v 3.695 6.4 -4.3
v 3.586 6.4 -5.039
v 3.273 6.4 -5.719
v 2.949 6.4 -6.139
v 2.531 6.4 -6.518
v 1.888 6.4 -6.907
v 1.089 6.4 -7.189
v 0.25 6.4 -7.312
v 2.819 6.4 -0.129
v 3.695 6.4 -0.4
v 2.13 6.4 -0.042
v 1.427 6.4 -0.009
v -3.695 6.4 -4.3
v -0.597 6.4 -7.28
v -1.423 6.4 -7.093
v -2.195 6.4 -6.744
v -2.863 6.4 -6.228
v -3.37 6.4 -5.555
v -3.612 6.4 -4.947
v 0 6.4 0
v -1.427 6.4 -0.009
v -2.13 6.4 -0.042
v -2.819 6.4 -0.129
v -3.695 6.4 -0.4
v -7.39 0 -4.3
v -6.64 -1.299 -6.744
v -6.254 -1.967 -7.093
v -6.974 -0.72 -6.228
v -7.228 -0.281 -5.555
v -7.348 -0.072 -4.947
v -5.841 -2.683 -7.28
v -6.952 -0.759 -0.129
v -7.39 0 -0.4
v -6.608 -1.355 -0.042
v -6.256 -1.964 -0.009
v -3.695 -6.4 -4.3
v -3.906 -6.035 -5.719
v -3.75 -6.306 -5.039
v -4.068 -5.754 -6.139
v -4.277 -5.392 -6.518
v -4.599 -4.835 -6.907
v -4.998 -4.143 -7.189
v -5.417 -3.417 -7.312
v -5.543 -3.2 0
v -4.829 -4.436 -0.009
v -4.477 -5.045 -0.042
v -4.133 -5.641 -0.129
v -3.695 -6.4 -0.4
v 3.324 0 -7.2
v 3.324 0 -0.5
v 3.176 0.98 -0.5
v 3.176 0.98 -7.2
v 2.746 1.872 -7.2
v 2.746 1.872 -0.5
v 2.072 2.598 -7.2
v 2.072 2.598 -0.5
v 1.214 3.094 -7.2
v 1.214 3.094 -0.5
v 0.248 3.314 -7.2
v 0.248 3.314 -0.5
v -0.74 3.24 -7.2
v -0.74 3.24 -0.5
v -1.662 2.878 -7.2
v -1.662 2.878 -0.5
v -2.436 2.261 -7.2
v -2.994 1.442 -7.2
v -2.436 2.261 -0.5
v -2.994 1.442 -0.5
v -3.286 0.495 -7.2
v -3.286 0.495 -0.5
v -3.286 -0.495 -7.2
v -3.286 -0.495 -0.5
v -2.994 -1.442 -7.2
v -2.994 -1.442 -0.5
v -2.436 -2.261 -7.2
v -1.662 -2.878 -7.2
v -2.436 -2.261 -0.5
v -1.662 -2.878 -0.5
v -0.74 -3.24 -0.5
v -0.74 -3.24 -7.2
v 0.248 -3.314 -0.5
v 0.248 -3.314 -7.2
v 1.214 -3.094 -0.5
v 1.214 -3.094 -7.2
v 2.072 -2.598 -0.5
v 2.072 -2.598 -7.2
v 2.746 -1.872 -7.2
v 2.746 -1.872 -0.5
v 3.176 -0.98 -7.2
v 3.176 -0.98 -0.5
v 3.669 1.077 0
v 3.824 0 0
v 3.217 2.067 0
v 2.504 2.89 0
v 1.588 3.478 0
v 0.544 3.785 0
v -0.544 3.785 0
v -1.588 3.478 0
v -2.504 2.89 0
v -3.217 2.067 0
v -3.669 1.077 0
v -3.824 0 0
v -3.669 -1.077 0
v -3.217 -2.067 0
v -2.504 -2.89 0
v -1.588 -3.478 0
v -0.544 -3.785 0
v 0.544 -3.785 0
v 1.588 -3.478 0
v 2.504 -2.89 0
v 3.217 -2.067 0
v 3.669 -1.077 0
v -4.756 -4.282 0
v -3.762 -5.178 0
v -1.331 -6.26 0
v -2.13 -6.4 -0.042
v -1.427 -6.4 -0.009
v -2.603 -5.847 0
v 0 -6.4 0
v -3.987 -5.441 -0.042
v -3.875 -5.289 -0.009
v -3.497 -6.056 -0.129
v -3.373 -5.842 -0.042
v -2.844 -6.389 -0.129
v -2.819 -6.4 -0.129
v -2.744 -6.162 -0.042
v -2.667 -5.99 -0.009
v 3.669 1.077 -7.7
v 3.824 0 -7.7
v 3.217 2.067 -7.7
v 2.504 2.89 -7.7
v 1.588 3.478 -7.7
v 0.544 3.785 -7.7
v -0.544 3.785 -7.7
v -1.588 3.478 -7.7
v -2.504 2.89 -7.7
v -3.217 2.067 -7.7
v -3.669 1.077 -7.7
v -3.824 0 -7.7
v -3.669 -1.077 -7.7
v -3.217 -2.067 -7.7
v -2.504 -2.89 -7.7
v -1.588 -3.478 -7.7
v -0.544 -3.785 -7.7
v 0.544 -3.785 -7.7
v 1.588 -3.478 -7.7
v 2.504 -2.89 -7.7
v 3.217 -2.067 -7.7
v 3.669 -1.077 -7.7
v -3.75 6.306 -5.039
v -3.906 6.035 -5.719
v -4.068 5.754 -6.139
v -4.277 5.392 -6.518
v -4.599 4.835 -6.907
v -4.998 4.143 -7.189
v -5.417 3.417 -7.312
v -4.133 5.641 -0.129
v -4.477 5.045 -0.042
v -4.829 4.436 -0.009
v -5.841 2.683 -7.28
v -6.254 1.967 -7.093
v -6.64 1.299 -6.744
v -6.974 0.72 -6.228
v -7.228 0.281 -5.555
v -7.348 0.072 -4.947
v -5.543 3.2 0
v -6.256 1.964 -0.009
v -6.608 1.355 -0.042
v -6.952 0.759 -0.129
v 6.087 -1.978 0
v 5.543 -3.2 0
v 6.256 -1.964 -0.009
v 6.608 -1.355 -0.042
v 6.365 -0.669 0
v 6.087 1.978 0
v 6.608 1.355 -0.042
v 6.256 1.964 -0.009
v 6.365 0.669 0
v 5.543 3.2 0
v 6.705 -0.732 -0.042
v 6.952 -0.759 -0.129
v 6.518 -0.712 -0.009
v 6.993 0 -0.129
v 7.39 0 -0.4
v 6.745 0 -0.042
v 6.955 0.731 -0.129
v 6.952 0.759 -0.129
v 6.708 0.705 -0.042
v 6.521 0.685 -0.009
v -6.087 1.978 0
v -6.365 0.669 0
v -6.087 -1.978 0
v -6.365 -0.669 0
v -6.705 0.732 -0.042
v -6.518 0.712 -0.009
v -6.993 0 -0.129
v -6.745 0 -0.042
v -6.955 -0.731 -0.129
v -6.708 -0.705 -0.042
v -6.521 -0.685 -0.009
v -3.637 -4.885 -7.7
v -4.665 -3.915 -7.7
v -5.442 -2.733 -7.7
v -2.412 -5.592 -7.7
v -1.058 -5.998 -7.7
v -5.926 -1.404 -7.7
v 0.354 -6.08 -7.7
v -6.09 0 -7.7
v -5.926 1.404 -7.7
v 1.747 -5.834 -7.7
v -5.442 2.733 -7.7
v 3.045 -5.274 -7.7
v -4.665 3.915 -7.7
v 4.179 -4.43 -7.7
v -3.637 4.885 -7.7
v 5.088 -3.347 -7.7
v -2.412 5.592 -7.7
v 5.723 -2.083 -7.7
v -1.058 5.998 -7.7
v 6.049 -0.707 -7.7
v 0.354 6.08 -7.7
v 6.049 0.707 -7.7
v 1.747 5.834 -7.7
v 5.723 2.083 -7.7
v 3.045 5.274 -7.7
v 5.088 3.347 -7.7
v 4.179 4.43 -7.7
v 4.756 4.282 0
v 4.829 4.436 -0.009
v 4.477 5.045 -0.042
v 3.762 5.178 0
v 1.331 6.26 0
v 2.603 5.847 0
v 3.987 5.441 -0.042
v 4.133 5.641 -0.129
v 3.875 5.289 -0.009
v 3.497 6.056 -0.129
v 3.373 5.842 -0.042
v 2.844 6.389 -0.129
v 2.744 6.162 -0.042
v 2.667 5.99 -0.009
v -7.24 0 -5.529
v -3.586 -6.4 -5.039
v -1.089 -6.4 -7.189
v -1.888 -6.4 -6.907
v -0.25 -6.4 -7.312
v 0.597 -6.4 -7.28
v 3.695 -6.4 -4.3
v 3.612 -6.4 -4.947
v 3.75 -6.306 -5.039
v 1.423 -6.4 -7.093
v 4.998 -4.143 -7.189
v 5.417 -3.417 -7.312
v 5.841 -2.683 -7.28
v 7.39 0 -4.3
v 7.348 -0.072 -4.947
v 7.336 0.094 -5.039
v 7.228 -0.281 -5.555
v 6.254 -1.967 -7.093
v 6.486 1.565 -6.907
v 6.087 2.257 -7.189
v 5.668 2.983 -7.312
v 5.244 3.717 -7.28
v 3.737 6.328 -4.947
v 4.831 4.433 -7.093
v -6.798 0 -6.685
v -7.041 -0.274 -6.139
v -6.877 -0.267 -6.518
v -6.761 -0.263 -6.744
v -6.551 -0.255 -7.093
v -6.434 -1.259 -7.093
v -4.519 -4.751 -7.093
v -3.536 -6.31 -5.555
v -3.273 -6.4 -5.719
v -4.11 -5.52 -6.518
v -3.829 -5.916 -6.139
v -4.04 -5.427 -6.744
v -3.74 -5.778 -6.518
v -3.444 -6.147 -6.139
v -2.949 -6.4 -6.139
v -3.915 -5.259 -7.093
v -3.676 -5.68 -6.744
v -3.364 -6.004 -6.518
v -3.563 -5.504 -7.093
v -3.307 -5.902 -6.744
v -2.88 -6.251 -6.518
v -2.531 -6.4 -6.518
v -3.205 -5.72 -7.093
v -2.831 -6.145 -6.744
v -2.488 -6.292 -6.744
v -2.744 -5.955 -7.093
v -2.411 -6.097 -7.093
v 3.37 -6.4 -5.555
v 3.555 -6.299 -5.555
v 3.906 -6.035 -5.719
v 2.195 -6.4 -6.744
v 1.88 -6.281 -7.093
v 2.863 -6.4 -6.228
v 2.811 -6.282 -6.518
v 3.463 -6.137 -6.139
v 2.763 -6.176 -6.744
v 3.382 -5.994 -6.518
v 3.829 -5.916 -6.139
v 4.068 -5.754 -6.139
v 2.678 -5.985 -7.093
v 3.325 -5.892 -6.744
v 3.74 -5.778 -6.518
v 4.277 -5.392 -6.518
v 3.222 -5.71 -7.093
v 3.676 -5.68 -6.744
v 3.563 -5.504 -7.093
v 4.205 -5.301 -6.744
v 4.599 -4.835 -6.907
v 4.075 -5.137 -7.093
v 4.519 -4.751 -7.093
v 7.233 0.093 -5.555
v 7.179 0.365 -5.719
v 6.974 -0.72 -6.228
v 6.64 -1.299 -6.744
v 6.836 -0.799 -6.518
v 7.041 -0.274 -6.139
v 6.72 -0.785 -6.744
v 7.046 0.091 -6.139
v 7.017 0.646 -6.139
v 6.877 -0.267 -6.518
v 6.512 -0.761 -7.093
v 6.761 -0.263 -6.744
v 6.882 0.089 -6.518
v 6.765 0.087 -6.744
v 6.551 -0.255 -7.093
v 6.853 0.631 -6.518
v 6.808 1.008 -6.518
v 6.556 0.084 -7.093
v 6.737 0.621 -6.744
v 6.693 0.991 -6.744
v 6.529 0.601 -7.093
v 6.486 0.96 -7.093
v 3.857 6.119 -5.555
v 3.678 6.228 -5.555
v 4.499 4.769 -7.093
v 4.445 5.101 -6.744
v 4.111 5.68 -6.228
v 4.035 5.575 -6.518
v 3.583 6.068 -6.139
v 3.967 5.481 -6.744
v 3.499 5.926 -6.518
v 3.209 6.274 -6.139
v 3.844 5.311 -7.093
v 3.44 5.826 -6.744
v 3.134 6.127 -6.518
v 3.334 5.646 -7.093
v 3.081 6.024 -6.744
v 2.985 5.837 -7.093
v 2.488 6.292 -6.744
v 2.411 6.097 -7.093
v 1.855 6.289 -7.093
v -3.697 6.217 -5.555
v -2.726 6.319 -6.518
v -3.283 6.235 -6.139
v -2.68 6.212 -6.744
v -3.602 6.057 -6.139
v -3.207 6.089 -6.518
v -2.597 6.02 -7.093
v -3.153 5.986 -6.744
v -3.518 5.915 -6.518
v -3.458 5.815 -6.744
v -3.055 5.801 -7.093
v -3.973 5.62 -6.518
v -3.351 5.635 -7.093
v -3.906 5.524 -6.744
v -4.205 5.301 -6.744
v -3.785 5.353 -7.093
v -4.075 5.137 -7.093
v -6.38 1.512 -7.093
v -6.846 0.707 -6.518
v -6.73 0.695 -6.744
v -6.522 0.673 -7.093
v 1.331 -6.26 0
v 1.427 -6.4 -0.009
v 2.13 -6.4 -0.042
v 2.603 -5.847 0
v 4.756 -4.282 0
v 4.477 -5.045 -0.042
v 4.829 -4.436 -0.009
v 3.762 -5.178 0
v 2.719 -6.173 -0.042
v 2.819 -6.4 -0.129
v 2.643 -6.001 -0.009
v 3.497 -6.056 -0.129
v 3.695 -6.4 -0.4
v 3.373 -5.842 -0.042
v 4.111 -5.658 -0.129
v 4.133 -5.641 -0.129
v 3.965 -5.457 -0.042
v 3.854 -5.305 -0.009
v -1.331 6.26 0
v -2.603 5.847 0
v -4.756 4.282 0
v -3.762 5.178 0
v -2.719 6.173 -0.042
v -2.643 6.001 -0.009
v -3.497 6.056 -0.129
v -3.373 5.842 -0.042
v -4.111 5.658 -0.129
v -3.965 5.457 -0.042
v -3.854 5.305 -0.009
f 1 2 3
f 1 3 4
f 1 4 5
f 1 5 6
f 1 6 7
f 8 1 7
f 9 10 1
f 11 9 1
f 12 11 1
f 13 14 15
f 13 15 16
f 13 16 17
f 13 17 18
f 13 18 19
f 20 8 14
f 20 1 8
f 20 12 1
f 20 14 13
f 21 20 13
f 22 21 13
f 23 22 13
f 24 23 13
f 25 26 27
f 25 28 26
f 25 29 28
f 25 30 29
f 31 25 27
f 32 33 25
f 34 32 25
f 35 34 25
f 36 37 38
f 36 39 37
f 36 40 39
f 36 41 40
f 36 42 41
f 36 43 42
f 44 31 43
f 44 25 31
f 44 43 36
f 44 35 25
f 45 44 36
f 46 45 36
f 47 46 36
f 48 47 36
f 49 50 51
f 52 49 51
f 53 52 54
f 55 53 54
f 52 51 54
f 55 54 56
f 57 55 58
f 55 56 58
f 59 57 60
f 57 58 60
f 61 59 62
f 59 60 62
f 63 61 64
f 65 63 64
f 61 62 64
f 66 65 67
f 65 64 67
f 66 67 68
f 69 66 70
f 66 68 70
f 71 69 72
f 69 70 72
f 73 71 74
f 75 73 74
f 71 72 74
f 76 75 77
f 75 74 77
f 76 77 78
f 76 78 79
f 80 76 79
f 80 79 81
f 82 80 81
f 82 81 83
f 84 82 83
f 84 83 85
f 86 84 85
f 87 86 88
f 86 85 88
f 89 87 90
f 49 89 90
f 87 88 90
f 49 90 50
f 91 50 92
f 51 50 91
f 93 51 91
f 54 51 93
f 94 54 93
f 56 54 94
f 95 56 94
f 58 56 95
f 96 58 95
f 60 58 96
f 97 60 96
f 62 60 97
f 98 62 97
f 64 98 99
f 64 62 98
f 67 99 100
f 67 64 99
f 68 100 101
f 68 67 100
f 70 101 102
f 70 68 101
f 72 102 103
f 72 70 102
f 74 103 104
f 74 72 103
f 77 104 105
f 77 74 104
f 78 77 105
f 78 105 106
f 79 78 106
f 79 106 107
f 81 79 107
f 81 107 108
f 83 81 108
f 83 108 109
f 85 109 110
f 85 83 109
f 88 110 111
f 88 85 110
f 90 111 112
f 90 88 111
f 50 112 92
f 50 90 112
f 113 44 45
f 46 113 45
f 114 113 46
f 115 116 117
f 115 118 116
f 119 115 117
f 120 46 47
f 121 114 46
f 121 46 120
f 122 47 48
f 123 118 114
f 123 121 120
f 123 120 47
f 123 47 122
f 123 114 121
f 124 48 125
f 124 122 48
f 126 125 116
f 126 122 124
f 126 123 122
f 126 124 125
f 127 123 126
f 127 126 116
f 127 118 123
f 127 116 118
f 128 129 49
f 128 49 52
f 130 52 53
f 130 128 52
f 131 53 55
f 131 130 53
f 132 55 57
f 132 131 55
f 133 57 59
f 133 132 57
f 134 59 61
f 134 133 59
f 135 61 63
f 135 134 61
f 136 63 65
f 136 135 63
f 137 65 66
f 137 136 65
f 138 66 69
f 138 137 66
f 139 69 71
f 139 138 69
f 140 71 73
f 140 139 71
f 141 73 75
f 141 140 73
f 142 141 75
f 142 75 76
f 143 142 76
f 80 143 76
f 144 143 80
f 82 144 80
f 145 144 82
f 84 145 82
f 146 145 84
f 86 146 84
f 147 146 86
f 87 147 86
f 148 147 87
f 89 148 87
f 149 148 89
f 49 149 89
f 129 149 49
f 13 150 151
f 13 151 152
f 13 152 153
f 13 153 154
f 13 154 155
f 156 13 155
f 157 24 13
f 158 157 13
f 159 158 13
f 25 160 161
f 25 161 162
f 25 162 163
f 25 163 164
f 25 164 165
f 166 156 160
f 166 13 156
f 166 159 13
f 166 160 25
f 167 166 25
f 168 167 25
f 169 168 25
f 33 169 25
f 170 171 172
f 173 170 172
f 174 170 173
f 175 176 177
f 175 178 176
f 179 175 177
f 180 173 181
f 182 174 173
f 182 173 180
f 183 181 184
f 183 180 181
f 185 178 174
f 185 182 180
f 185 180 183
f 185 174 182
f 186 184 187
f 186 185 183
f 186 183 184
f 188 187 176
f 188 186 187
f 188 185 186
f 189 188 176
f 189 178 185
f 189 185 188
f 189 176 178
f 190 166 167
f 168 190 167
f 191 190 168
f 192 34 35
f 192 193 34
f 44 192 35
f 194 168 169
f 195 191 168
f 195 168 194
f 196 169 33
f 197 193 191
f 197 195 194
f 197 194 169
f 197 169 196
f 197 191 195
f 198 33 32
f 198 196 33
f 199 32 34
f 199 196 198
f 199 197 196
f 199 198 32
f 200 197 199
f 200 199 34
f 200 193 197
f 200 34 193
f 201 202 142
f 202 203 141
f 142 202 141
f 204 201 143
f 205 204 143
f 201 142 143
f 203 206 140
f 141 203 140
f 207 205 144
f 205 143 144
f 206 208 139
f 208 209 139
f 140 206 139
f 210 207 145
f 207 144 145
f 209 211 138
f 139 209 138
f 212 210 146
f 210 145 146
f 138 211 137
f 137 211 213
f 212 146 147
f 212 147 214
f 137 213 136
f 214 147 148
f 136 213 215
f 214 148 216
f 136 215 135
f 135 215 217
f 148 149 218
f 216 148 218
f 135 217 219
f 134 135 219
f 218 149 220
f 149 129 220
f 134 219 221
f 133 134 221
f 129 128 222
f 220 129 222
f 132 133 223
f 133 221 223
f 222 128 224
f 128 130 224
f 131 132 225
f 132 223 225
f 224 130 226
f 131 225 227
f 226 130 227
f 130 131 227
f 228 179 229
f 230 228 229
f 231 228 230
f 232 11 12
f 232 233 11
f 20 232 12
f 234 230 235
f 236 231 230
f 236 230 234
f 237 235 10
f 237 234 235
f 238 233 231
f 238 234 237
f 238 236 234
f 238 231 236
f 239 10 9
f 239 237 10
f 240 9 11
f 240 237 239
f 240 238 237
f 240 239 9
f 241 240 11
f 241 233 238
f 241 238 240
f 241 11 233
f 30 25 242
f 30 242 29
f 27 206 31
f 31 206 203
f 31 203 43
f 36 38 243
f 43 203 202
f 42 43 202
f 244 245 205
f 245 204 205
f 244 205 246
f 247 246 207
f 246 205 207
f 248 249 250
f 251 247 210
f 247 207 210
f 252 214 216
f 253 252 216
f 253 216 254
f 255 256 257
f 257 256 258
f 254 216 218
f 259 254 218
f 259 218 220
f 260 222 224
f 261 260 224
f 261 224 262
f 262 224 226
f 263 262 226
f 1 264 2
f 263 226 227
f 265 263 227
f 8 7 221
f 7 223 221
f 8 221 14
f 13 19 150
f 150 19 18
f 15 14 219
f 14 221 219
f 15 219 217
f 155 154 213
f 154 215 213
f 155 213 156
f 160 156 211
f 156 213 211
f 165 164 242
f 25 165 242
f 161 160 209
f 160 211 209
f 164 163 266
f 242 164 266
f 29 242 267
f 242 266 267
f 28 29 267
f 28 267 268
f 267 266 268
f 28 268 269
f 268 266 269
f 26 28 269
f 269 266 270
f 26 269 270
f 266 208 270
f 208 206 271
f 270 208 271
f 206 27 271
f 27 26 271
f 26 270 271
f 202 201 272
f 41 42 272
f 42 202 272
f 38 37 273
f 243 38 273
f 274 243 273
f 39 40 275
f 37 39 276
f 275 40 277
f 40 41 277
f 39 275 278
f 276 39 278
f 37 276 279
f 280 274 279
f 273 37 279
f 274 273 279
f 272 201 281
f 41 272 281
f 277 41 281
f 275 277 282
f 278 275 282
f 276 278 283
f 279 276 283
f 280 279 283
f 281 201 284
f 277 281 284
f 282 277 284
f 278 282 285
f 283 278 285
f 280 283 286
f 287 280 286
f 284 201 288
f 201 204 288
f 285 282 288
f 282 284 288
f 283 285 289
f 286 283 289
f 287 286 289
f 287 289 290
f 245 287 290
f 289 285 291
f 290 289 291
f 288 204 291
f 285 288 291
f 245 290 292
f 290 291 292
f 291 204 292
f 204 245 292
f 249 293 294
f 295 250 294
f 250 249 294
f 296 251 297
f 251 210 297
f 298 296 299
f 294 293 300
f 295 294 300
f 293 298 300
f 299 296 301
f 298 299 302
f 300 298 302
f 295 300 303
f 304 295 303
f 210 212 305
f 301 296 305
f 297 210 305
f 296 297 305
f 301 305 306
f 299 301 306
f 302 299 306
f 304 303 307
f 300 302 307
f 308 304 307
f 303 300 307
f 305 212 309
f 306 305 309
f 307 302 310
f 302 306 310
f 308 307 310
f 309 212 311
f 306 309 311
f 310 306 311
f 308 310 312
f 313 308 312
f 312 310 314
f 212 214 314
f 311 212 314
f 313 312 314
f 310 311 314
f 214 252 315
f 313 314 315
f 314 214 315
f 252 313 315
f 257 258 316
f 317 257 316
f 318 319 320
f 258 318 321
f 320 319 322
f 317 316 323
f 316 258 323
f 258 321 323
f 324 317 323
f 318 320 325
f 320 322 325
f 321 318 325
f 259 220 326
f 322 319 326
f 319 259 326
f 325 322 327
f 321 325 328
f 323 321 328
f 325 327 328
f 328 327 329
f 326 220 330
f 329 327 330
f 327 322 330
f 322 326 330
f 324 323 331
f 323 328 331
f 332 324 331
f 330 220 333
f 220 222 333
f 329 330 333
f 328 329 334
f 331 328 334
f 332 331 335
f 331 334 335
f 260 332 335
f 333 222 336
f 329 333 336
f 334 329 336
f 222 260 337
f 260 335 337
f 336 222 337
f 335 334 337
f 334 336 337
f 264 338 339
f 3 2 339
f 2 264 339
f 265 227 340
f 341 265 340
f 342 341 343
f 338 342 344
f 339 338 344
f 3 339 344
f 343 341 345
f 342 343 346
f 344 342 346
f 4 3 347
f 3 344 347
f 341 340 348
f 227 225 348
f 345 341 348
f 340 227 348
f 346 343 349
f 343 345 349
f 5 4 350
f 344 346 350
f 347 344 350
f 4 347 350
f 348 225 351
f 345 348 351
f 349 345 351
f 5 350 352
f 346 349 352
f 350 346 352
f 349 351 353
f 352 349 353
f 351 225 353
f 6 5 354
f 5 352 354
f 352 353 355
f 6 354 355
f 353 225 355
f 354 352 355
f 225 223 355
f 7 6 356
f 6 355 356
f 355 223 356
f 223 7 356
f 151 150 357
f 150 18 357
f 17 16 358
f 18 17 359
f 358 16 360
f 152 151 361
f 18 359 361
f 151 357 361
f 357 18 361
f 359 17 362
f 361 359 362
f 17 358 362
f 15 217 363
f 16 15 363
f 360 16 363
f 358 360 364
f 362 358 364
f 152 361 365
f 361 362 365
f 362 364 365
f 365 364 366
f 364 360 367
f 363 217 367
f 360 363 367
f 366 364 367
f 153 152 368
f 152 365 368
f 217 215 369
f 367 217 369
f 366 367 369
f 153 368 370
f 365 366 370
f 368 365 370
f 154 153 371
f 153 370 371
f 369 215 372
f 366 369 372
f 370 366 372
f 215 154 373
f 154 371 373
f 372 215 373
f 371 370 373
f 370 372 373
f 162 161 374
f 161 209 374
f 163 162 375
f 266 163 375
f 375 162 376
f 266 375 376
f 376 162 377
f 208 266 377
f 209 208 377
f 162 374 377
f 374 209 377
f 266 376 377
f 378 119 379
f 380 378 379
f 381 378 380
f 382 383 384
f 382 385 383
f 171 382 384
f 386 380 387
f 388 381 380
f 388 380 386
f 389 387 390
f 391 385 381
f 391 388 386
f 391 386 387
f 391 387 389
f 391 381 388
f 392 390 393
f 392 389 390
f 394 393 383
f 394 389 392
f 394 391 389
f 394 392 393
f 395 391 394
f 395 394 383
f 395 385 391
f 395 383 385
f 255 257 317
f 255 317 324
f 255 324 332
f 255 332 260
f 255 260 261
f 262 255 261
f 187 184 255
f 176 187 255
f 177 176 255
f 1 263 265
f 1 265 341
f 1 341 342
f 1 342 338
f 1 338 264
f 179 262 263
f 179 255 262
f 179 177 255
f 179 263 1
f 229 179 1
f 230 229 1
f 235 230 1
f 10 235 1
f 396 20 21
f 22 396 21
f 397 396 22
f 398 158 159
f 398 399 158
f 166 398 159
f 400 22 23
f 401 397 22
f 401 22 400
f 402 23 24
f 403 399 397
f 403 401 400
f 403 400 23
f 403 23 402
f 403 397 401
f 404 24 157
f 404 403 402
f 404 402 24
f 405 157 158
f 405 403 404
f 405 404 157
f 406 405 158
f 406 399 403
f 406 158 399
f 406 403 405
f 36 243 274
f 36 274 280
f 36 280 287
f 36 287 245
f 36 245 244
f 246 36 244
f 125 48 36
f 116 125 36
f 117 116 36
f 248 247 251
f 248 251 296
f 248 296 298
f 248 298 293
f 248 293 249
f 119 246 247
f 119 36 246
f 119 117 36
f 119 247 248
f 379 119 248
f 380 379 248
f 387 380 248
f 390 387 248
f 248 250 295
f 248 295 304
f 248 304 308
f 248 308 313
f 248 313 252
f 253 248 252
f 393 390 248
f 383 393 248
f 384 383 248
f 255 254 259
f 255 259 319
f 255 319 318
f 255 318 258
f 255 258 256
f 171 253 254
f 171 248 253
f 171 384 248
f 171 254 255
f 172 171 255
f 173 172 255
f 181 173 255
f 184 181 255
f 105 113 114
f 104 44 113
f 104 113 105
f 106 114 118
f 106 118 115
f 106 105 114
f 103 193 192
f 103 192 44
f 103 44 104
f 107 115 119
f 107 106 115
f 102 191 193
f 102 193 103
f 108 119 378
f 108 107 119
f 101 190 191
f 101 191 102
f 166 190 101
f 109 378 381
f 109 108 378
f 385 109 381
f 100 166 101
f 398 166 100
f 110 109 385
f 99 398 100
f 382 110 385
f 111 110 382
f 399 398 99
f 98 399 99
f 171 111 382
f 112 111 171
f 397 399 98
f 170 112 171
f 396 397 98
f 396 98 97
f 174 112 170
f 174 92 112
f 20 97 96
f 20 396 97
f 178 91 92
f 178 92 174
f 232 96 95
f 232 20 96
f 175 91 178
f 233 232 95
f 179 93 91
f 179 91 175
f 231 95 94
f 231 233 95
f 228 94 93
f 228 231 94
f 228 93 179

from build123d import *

# Parameters (mm, degrees)
SKETCH1_R           = 3.3235
BOSS_EXTRUDE1_DEPTH = 7.7
CHAMFER1_SIZE       = 0.5


with BuildPart() as part:
    # Sketch1 → Boss-Extrude1 (new body)
    with BuildSketch(Plane.XY):
        Polygon((3.695041723, 6.4), (-3.695041723, 6.4), (-7.390083446, 0), (-3.695041723, -6.4), (3.695041723, -6.4), (7.390083446, 0), align=None)
        Circle(SKETCH1_R, mode=Mode.SUBTRACT)
    extrude(amount=-BOSS_EXTRUDE1_DEPTH)

    # Sketch2 → Cut-Revolve1 (revolve, cut)
    with BuildSketch(Plane(origin=(0, 0, 0), x_dir=(1, 0, 0), z_dir=(0, 1, 0))):
        with BuildLine():
            Line((-7.390083446, 7.7), (-7.390083446, 4.3))
            ThreePointArc((-7.390083446, 4.3), (-7.05400145, 6.120027472), (-6.090083446, 7.7))
            Line((-6.090083446, 7.7), (-7.390083446, 7.7))
        make_face()
        with BuildLine():
            Line((-7.390083446, 0), (-7.390083446, 0.4))
            ThreePointArc((-7.390083446, 0.4), (-6.933916011, 0.103778026), (-6.4, 0))
            Line((-6.4, 0), (-7.390083446, 0))
        make_face()
    revolve(axis=Axis((0, 0, -8.105120256), (0, 0, 1)), mode=Mode.SUBTRACT)

    # Chamfer1
    chamfer1_edges = [part.edges().sort_by_distance(p)[0] for p in [
        (-3.3235, 0, -7.7),
        (-3.3235, 0, 0),
    ]]
    chamfer(chamfer1_edges, length=CHAMFER1_SIZE)


solid = part.part
